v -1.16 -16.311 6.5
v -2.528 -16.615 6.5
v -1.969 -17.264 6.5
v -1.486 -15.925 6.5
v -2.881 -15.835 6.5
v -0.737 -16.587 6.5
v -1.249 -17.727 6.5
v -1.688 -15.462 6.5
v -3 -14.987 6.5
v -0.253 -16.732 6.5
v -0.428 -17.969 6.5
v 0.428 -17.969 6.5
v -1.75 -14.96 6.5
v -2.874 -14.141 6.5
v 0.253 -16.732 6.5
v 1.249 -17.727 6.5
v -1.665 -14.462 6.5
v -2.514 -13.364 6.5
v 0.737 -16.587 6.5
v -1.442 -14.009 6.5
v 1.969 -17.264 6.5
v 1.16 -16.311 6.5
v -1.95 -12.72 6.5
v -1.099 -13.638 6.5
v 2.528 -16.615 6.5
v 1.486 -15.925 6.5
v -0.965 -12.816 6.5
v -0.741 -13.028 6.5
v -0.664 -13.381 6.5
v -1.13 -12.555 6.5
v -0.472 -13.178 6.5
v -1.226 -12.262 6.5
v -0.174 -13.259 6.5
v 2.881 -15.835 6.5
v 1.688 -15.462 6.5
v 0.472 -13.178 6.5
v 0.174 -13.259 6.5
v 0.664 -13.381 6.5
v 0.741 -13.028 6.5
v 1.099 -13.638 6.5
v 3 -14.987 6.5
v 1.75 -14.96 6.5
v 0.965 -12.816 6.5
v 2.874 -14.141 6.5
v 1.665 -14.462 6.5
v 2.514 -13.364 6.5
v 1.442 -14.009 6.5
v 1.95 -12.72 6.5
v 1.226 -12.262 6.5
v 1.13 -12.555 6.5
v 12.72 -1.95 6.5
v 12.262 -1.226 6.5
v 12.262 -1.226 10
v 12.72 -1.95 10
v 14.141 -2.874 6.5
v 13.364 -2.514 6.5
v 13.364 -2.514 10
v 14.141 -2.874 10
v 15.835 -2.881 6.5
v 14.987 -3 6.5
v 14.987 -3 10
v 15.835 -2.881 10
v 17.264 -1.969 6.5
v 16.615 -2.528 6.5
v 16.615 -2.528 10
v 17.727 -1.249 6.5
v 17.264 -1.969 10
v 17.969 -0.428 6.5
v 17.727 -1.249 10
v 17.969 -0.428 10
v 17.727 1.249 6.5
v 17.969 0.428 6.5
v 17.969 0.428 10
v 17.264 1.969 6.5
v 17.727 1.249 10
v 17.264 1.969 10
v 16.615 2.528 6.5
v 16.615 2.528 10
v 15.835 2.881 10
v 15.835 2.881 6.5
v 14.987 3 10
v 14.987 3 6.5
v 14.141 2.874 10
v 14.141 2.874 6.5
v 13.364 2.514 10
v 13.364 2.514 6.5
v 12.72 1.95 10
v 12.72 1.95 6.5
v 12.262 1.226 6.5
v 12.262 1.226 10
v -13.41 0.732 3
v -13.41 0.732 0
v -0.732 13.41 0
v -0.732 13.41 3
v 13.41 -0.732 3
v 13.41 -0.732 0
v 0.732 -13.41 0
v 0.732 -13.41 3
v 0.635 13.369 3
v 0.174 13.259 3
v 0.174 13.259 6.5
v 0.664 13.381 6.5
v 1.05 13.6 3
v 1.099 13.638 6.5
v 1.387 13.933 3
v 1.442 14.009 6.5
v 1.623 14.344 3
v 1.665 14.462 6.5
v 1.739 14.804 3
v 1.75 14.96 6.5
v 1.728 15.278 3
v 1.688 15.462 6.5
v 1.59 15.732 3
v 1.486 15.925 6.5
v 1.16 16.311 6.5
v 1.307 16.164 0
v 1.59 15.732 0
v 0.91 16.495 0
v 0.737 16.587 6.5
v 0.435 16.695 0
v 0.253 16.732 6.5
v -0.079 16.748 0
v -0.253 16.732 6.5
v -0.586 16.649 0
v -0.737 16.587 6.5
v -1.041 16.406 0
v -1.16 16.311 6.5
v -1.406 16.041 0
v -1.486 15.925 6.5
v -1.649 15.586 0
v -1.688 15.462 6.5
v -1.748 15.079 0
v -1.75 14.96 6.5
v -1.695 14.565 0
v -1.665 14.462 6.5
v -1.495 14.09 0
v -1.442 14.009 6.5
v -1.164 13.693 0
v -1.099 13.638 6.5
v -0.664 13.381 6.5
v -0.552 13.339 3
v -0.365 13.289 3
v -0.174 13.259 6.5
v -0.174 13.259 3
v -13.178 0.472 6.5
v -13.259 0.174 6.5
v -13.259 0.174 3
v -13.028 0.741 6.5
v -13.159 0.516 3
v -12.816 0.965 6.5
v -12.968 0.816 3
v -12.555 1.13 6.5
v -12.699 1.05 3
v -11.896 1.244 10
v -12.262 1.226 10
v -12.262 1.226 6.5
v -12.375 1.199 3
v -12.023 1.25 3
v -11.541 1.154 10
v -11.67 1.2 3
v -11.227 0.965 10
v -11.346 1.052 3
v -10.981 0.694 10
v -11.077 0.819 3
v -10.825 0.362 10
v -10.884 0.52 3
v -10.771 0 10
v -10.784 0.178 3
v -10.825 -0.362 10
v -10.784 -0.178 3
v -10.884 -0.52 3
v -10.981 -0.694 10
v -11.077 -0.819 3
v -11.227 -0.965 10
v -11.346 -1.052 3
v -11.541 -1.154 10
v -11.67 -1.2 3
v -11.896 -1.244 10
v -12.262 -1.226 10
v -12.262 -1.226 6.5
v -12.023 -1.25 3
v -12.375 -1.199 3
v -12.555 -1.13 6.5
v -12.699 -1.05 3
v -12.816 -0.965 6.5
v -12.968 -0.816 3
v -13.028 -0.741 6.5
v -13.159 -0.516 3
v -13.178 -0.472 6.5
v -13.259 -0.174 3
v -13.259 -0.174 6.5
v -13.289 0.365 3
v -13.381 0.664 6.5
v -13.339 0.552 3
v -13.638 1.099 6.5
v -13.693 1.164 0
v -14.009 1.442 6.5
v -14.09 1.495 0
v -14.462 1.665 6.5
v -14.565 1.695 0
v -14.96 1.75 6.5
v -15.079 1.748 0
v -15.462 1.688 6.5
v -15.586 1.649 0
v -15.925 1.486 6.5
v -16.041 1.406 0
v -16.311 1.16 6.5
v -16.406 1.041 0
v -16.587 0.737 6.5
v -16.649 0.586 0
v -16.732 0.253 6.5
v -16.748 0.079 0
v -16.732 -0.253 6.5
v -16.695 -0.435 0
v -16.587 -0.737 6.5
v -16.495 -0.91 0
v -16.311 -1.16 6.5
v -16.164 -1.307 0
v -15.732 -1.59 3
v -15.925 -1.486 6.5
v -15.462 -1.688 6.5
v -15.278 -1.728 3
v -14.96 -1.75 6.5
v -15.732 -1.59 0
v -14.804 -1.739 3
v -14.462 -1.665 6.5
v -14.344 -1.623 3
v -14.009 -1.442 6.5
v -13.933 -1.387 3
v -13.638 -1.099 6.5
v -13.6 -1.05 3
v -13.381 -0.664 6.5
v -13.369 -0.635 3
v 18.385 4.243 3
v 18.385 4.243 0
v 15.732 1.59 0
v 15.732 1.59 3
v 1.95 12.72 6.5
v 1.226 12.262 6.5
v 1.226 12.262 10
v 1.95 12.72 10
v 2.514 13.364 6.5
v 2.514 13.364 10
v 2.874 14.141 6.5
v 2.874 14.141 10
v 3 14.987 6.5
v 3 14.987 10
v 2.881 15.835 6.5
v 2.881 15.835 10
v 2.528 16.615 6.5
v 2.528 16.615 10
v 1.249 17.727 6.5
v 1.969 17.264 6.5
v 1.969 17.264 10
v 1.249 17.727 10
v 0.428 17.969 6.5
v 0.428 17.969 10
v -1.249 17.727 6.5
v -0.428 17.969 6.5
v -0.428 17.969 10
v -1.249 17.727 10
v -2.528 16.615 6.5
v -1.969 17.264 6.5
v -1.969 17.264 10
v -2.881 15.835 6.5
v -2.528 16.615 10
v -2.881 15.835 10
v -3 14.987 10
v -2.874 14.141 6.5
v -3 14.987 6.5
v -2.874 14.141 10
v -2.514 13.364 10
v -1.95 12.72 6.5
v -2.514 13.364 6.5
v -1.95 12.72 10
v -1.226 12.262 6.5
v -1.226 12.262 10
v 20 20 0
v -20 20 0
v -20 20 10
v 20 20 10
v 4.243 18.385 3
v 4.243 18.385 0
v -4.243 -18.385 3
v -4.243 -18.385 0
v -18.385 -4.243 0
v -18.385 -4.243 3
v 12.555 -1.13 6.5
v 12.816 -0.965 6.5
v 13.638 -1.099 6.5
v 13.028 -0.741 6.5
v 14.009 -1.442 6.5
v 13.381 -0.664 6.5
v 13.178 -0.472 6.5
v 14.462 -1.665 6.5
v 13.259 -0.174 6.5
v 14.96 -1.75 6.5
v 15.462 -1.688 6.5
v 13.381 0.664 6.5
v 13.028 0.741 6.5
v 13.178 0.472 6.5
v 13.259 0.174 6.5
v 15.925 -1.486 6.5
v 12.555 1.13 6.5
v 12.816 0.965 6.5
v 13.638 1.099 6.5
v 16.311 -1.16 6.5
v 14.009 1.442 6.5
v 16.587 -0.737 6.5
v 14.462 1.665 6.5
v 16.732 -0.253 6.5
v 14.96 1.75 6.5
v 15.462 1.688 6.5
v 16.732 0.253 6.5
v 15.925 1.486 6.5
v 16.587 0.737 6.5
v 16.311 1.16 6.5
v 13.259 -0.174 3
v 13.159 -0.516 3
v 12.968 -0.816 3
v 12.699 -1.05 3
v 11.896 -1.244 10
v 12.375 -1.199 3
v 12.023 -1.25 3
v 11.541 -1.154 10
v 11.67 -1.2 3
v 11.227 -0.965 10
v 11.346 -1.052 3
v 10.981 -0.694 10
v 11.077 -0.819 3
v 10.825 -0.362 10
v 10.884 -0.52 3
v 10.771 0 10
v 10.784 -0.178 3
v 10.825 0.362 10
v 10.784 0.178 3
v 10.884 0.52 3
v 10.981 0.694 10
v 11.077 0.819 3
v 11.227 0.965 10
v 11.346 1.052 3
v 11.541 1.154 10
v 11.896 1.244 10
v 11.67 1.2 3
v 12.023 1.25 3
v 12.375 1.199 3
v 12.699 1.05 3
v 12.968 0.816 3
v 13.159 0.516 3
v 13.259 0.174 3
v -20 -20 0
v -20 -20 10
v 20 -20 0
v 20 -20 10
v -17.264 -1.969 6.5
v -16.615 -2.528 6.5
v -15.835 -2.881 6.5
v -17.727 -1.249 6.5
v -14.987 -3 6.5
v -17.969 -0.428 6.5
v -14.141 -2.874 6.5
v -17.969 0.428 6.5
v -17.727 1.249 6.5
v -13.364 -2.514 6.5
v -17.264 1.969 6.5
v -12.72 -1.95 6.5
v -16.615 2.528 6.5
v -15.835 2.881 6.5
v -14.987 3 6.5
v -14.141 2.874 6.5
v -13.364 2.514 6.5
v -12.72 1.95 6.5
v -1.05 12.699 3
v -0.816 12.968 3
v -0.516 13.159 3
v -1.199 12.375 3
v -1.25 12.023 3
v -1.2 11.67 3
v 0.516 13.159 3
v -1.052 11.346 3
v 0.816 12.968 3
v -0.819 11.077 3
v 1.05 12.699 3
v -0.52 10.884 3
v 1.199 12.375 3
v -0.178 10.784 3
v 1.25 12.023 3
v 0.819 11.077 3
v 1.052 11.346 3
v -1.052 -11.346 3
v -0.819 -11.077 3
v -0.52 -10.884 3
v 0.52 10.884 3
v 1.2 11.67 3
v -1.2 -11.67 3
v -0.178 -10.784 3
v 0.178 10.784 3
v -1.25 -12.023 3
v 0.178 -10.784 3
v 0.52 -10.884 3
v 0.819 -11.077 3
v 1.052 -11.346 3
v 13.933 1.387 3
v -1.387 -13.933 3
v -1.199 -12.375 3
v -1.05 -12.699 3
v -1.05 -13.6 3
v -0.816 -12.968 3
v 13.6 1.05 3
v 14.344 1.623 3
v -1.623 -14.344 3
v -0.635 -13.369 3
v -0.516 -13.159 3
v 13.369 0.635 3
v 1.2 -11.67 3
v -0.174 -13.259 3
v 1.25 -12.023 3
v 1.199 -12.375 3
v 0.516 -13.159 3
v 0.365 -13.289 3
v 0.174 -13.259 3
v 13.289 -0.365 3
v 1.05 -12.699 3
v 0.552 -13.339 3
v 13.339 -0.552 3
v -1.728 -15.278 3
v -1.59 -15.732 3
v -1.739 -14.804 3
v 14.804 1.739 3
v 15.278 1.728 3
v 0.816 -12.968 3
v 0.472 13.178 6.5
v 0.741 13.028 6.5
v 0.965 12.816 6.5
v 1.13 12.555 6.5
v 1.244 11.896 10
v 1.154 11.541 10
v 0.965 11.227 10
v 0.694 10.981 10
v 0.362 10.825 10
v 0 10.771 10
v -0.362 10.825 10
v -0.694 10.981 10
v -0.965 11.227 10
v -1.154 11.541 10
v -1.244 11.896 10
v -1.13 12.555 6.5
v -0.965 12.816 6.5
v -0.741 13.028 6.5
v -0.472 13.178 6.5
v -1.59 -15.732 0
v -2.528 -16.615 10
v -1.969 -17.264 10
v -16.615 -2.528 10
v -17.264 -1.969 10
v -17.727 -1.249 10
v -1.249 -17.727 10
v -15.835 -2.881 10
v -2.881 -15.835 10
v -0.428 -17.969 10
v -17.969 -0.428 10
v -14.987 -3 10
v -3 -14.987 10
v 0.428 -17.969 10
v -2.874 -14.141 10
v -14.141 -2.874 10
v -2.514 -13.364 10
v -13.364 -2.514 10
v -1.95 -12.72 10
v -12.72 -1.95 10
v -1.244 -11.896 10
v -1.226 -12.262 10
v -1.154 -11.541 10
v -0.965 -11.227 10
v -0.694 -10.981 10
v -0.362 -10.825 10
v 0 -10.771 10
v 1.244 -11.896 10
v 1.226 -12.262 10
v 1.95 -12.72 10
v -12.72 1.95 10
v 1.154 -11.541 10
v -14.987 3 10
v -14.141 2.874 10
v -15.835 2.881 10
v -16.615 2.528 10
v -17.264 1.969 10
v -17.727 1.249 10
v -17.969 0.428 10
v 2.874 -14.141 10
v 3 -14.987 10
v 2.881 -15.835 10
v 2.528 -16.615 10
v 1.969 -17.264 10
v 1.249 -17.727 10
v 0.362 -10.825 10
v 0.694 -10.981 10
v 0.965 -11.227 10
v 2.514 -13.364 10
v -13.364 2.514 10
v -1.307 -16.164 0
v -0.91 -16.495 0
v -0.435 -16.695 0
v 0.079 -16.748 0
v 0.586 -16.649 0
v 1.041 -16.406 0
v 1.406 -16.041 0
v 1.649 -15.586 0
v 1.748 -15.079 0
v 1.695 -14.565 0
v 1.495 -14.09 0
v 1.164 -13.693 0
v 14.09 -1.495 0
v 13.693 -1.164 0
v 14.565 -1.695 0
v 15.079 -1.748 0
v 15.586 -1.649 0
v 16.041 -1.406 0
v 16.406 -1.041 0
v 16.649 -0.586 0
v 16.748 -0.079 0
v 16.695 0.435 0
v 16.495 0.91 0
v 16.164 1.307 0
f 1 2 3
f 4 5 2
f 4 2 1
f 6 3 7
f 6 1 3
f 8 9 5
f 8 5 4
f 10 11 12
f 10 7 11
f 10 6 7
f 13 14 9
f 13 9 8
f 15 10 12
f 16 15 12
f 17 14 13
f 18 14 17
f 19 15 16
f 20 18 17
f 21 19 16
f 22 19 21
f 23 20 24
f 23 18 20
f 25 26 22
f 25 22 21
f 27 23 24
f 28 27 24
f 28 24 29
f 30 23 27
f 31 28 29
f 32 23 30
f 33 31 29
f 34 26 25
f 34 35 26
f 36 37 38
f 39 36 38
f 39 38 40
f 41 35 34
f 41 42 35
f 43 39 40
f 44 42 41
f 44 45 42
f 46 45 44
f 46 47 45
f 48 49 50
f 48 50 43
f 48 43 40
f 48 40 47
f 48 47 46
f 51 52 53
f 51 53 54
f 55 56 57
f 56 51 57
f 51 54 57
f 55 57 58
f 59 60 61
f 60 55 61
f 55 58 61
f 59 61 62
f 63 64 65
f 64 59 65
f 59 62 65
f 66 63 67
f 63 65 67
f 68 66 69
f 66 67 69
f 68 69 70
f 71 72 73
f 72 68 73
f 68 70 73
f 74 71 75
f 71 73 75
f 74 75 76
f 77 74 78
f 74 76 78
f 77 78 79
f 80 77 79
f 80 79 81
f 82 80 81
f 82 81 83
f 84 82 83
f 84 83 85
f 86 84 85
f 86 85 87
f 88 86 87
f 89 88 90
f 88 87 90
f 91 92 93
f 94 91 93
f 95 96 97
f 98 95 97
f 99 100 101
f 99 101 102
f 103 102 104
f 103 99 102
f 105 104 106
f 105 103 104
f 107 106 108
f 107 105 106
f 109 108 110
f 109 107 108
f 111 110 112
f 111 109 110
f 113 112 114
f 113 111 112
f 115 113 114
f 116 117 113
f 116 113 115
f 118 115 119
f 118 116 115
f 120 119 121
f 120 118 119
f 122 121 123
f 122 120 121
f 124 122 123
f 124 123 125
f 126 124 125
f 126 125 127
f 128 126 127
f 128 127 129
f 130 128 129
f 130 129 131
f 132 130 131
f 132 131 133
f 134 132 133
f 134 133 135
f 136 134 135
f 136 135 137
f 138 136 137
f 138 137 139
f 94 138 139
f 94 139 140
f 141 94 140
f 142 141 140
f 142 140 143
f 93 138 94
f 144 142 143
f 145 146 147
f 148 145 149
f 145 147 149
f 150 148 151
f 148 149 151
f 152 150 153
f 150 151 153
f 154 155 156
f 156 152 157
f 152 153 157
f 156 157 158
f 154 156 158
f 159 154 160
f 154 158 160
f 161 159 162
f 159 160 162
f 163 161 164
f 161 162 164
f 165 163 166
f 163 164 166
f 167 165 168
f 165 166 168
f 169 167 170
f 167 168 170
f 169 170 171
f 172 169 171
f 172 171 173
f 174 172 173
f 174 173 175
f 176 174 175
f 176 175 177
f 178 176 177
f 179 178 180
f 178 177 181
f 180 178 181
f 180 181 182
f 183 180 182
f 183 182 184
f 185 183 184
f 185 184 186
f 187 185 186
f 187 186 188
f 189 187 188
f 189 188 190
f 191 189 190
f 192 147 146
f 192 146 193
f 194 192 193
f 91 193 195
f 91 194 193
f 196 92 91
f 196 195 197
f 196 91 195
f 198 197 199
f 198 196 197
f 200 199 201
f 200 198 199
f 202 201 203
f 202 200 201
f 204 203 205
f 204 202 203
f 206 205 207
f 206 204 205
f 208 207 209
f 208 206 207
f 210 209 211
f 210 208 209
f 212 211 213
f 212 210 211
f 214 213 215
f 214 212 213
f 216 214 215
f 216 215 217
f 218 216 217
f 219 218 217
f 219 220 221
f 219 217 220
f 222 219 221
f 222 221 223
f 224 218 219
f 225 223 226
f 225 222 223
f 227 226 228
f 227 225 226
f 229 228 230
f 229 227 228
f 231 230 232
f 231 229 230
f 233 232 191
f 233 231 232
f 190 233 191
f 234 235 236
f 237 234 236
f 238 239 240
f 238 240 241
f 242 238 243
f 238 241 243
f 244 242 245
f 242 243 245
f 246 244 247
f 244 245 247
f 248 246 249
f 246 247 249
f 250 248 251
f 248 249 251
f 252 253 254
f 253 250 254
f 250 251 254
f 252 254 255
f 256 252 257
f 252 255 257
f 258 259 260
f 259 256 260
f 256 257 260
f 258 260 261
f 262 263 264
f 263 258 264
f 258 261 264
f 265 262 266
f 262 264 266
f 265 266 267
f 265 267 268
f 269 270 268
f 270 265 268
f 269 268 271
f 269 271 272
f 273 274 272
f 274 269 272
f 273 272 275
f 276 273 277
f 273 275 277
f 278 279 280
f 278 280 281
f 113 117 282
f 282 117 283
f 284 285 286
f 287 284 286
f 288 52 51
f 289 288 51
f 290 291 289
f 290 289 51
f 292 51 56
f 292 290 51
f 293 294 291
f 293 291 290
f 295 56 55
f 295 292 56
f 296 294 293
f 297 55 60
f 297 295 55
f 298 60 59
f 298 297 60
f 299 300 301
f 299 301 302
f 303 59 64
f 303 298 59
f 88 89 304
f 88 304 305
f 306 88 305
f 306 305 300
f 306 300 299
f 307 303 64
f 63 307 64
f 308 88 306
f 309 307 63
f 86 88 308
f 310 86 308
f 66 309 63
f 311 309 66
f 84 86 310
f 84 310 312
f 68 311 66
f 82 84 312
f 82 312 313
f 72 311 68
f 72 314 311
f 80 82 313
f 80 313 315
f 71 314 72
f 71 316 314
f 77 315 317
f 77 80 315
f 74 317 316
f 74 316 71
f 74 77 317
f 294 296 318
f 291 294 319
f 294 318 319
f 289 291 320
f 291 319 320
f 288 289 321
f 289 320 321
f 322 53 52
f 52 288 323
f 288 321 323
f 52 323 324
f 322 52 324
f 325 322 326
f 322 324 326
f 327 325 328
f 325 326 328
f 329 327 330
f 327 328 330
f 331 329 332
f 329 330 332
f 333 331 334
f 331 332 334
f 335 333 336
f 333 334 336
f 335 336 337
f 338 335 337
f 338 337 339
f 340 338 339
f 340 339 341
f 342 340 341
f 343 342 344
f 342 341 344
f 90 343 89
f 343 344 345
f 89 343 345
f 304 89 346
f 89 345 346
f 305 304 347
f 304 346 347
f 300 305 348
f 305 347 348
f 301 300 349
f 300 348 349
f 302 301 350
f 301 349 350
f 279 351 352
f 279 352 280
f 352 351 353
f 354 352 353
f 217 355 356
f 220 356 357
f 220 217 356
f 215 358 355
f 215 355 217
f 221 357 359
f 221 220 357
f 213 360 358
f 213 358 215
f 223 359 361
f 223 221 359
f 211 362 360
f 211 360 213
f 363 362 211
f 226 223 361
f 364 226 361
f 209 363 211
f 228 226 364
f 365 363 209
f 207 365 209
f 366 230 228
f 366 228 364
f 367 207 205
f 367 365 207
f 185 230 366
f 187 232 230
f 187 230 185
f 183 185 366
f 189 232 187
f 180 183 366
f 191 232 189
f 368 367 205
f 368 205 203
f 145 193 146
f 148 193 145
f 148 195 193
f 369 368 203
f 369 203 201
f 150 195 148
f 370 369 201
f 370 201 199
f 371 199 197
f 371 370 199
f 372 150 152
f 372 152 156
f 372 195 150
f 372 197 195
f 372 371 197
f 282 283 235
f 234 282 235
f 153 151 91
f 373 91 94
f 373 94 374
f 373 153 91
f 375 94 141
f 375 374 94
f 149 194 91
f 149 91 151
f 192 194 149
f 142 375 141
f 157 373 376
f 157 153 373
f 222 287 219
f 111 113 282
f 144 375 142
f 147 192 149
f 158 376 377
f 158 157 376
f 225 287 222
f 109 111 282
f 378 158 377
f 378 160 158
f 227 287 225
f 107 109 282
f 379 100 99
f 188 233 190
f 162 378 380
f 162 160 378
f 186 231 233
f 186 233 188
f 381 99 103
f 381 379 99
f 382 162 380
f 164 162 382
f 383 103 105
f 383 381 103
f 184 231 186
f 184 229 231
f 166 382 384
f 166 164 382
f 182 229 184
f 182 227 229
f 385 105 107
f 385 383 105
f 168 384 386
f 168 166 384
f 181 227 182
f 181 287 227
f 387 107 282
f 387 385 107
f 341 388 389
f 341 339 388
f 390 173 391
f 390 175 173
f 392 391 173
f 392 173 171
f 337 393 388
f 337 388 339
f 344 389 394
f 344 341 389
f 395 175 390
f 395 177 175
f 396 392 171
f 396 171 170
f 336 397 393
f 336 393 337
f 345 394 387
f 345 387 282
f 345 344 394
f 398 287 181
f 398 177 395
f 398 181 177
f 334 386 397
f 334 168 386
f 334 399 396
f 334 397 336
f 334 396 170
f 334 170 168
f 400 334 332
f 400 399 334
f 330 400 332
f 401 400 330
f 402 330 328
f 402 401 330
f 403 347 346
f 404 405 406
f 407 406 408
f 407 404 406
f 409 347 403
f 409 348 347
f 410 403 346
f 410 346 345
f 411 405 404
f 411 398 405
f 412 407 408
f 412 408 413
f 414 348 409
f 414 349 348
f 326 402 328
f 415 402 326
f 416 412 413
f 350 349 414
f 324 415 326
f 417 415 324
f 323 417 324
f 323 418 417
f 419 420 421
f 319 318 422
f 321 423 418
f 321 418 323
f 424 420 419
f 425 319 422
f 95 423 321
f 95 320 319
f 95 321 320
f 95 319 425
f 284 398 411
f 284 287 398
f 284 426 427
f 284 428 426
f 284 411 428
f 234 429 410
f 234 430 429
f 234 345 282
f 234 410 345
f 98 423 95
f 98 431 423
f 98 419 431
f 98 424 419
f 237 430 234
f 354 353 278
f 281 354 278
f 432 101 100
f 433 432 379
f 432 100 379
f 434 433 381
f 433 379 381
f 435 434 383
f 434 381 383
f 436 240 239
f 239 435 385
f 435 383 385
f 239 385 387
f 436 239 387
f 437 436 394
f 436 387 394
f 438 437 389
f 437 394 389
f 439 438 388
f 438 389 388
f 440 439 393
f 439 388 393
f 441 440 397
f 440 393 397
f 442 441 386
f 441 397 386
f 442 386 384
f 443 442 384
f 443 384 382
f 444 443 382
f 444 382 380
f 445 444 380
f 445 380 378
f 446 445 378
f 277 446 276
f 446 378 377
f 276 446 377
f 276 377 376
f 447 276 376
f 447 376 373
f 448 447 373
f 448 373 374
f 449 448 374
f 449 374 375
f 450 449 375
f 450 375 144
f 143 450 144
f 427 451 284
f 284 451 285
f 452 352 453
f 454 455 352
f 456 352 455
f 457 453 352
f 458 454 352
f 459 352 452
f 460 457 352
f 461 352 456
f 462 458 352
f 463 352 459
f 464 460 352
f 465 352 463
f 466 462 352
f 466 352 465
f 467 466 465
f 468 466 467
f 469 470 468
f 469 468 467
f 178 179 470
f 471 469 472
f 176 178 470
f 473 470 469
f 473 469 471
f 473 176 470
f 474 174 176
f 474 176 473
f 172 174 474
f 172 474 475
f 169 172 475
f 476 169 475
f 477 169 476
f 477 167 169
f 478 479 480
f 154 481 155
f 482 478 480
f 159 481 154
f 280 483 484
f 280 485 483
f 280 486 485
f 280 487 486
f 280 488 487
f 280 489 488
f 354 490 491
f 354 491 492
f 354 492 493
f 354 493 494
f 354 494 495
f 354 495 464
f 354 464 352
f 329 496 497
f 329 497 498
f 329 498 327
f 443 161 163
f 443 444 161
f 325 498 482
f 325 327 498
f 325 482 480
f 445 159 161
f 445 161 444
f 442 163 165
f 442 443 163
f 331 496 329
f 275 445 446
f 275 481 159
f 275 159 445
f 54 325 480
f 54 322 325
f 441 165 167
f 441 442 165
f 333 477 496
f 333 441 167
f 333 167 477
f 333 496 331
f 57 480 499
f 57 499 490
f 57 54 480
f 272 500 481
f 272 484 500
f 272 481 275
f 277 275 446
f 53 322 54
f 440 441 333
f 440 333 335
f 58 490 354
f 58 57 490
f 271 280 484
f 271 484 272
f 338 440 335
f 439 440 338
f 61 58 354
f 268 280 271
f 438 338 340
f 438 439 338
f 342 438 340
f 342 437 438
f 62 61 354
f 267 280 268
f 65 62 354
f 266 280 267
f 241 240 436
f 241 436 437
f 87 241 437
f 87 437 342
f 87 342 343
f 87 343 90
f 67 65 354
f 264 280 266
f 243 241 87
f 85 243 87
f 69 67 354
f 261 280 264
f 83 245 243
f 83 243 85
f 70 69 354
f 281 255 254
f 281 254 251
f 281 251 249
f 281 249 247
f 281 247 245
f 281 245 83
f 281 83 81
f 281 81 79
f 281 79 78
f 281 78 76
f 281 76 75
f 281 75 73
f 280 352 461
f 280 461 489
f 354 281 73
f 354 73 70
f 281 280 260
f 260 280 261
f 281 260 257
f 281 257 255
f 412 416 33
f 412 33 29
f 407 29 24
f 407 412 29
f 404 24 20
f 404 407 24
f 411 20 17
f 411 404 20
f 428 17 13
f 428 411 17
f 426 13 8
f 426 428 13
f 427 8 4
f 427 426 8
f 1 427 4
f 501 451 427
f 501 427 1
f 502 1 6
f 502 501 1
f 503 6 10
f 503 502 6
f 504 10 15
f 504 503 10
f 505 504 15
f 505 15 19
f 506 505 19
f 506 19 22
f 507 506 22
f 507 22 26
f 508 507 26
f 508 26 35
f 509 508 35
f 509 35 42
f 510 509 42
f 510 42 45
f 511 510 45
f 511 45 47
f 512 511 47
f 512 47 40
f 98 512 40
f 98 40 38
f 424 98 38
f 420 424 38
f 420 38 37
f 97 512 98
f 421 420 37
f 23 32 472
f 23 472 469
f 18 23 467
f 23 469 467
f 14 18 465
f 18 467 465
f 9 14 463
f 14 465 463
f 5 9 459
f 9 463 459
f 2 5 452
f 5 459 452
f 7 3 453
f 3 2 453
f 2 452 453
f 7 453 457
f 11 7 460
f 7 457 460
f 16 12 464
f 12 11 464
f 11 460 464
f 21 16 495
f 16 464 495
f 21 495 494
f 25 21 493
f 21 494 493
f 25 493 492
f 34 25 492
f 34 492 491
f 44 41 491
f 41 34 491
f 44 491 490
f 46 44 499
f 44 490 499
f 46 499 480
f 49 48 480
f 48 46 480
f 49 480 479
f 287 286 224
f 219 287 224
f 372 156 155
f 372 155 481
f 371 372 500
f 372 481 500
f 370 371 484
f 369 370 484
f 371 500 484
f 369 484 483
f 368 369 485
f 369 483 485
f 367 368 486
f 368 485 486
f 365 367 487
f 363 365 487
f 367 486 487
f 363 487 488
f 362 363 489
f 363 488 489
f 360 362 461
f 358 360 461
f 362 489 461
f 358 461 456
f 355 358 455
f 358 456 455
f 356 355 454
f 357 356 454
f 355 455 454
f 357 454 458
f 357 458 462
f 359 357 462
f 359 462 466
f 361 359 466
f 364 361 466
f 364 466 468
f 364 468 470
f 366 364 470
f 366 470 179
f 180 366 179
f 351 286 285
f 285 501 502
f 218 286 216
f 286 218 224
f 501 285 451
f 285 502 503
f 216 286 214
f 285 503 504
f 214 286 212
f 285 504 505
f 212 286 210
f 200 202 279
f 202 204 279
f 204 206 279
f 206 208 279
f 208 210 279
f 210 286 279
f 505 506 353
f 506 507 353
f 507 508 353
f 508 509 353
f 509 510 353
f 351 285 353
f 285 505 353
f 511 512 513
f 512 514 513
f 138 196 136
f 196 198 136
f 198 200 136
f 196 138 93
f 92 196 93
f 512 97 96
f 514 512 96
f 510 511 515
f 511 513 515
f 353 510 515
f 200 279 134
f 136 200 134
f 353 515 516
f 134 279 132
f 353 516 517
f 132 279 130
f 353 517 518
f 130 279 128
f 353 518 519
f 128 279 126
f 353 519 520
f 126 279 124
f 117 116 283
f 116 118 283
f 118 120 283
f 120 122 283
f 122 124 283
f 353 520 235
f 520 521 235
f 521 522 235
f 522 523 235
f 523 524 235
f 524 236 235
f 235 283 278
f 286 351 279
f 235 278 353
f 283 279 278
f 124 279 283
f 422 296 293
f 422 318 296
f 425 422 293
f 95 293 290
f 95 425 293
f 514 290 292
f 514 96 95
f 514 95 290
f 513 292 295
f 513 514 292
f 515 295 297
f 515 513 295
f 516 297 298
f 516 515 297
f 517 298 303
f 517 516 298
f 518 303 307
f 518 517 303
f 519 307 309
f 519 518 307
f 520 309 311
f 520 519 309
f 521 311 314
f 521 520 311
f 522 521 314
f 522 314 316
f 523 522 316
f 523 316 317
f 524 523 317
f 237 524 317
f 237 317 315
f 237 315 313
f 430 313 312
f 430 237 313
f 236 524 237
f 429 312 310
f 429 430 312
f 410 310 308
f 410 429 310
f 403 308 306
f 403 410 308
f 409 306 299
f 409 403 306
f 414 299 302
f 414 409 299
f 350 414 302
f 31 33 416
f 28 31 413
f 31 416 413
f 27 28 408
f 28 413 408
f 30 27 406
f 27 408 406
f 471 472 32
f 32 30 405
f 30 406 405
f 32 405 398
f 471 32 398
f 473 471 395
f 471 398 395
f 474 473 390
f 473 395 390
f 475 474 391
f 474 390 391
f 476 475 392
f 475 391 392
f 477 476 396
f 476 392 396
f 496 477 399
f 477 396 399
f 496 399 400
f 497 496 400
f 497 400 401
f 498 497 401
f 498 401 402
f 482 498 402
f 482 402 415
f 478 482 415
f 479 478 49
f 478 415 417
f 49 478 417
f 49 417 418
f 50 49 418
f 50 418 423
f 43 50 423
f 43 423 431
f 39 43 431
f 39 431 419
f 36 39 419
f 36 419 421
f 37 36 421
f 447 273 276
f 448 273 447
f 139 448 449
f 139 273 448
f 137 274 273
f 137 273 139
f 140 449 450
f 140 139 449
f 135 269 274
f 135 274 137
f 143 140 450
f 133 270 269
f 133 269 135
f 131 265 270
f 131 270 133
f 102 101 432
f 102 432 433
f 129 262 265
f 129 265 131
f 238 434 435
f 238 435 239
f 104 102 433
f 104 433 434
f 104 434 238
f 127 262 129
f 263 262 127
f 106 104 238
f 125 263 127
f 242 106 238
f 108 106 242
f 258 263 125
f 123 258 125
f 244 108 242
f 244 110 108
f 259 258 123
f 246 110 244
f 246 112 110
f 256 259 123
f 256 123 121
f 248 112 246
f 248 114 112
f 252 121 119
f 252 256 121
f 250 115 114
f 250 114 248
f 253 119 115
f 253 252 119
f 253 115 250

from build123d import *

# Parameters (mm, degrees)
F0_W     = 40
F0_H     = 40
F0_R     = 1.75
F1_DEPTH = 10
F2_R     = 3
F3_DEPTH = 3.5
F5_DEPTH = 3
F6_R     = 1.25
F7_DEPTH = 10.001


with BuildPart() as f1:
    # F0 (on Top) → F1 (new body)
    with BuildSketch(Plane.XY):
        Rectangle(F0_W, F0_H)
        with Locations((0, -15)):
            Circle(F0_R, mode=Mode.SUBTRACT)
        with Locations((-15, 0)):
            Circle(F0_R, mode=Mode.SUBTRACT)
        with Locations((15, 0)):
            Circle(F0_R, mode=Mode.SUBTRACT)
        with Locations((0, 15)):
            Circle(F0_R, mode=Mode.SUBTRACT)
    extrude(amount=F1_DEPTH)

    # F2 (on face) → F3 (cut)
    with BuildSketch(Plane.XY.offset(10)):
        with Locations((-15, 0)):
            Circle(F2_R)
        with Locations((0, 15)):
            Circle(F2_R)
        with Locations((15, 0)):
            Circle(F2_R)
        with Locations((0, -15)):
            Circle(F2_R)
    extrude(amount=-F3_DEPTH, mode=Mode.SUBTRACT)

    # F4 (on face) → F5 (cut)
    with BuildSketch(Plane(origin=(0, 0, 0), x_dir=(1, 0, 0), z_dir=(0, 0, -1))):
        Polygon((4.242641, -18.384776), (18.384776, -4.242641), (-4.242641, 18.384776), (-18.384776, 4.242641), align=None)
    extrude(amount=-F5_DEPTH, mode=Mode.SUBTRACT)

    # F6 (on face) → F7 (cut, through all)
    with BuildSketch(Plane(origin=(0, 0, 0), x_dir=(1, 0, 0), z_dir=(0, 0, -1))):
        with Locations((0, 12.020815)):
            Circle(F6_R)
        with Locations((12.020815, 0)):
            Circle(F6_R)
        with Locations((-12.020815, 0)):
            Circle(F6_R)
        with Locations((0, -12.020815)):
            Circle(F6_R)
    extrude(amount=-F7_DEPTH, mode=Mode.SUBTRACT)


solid = f1.part
